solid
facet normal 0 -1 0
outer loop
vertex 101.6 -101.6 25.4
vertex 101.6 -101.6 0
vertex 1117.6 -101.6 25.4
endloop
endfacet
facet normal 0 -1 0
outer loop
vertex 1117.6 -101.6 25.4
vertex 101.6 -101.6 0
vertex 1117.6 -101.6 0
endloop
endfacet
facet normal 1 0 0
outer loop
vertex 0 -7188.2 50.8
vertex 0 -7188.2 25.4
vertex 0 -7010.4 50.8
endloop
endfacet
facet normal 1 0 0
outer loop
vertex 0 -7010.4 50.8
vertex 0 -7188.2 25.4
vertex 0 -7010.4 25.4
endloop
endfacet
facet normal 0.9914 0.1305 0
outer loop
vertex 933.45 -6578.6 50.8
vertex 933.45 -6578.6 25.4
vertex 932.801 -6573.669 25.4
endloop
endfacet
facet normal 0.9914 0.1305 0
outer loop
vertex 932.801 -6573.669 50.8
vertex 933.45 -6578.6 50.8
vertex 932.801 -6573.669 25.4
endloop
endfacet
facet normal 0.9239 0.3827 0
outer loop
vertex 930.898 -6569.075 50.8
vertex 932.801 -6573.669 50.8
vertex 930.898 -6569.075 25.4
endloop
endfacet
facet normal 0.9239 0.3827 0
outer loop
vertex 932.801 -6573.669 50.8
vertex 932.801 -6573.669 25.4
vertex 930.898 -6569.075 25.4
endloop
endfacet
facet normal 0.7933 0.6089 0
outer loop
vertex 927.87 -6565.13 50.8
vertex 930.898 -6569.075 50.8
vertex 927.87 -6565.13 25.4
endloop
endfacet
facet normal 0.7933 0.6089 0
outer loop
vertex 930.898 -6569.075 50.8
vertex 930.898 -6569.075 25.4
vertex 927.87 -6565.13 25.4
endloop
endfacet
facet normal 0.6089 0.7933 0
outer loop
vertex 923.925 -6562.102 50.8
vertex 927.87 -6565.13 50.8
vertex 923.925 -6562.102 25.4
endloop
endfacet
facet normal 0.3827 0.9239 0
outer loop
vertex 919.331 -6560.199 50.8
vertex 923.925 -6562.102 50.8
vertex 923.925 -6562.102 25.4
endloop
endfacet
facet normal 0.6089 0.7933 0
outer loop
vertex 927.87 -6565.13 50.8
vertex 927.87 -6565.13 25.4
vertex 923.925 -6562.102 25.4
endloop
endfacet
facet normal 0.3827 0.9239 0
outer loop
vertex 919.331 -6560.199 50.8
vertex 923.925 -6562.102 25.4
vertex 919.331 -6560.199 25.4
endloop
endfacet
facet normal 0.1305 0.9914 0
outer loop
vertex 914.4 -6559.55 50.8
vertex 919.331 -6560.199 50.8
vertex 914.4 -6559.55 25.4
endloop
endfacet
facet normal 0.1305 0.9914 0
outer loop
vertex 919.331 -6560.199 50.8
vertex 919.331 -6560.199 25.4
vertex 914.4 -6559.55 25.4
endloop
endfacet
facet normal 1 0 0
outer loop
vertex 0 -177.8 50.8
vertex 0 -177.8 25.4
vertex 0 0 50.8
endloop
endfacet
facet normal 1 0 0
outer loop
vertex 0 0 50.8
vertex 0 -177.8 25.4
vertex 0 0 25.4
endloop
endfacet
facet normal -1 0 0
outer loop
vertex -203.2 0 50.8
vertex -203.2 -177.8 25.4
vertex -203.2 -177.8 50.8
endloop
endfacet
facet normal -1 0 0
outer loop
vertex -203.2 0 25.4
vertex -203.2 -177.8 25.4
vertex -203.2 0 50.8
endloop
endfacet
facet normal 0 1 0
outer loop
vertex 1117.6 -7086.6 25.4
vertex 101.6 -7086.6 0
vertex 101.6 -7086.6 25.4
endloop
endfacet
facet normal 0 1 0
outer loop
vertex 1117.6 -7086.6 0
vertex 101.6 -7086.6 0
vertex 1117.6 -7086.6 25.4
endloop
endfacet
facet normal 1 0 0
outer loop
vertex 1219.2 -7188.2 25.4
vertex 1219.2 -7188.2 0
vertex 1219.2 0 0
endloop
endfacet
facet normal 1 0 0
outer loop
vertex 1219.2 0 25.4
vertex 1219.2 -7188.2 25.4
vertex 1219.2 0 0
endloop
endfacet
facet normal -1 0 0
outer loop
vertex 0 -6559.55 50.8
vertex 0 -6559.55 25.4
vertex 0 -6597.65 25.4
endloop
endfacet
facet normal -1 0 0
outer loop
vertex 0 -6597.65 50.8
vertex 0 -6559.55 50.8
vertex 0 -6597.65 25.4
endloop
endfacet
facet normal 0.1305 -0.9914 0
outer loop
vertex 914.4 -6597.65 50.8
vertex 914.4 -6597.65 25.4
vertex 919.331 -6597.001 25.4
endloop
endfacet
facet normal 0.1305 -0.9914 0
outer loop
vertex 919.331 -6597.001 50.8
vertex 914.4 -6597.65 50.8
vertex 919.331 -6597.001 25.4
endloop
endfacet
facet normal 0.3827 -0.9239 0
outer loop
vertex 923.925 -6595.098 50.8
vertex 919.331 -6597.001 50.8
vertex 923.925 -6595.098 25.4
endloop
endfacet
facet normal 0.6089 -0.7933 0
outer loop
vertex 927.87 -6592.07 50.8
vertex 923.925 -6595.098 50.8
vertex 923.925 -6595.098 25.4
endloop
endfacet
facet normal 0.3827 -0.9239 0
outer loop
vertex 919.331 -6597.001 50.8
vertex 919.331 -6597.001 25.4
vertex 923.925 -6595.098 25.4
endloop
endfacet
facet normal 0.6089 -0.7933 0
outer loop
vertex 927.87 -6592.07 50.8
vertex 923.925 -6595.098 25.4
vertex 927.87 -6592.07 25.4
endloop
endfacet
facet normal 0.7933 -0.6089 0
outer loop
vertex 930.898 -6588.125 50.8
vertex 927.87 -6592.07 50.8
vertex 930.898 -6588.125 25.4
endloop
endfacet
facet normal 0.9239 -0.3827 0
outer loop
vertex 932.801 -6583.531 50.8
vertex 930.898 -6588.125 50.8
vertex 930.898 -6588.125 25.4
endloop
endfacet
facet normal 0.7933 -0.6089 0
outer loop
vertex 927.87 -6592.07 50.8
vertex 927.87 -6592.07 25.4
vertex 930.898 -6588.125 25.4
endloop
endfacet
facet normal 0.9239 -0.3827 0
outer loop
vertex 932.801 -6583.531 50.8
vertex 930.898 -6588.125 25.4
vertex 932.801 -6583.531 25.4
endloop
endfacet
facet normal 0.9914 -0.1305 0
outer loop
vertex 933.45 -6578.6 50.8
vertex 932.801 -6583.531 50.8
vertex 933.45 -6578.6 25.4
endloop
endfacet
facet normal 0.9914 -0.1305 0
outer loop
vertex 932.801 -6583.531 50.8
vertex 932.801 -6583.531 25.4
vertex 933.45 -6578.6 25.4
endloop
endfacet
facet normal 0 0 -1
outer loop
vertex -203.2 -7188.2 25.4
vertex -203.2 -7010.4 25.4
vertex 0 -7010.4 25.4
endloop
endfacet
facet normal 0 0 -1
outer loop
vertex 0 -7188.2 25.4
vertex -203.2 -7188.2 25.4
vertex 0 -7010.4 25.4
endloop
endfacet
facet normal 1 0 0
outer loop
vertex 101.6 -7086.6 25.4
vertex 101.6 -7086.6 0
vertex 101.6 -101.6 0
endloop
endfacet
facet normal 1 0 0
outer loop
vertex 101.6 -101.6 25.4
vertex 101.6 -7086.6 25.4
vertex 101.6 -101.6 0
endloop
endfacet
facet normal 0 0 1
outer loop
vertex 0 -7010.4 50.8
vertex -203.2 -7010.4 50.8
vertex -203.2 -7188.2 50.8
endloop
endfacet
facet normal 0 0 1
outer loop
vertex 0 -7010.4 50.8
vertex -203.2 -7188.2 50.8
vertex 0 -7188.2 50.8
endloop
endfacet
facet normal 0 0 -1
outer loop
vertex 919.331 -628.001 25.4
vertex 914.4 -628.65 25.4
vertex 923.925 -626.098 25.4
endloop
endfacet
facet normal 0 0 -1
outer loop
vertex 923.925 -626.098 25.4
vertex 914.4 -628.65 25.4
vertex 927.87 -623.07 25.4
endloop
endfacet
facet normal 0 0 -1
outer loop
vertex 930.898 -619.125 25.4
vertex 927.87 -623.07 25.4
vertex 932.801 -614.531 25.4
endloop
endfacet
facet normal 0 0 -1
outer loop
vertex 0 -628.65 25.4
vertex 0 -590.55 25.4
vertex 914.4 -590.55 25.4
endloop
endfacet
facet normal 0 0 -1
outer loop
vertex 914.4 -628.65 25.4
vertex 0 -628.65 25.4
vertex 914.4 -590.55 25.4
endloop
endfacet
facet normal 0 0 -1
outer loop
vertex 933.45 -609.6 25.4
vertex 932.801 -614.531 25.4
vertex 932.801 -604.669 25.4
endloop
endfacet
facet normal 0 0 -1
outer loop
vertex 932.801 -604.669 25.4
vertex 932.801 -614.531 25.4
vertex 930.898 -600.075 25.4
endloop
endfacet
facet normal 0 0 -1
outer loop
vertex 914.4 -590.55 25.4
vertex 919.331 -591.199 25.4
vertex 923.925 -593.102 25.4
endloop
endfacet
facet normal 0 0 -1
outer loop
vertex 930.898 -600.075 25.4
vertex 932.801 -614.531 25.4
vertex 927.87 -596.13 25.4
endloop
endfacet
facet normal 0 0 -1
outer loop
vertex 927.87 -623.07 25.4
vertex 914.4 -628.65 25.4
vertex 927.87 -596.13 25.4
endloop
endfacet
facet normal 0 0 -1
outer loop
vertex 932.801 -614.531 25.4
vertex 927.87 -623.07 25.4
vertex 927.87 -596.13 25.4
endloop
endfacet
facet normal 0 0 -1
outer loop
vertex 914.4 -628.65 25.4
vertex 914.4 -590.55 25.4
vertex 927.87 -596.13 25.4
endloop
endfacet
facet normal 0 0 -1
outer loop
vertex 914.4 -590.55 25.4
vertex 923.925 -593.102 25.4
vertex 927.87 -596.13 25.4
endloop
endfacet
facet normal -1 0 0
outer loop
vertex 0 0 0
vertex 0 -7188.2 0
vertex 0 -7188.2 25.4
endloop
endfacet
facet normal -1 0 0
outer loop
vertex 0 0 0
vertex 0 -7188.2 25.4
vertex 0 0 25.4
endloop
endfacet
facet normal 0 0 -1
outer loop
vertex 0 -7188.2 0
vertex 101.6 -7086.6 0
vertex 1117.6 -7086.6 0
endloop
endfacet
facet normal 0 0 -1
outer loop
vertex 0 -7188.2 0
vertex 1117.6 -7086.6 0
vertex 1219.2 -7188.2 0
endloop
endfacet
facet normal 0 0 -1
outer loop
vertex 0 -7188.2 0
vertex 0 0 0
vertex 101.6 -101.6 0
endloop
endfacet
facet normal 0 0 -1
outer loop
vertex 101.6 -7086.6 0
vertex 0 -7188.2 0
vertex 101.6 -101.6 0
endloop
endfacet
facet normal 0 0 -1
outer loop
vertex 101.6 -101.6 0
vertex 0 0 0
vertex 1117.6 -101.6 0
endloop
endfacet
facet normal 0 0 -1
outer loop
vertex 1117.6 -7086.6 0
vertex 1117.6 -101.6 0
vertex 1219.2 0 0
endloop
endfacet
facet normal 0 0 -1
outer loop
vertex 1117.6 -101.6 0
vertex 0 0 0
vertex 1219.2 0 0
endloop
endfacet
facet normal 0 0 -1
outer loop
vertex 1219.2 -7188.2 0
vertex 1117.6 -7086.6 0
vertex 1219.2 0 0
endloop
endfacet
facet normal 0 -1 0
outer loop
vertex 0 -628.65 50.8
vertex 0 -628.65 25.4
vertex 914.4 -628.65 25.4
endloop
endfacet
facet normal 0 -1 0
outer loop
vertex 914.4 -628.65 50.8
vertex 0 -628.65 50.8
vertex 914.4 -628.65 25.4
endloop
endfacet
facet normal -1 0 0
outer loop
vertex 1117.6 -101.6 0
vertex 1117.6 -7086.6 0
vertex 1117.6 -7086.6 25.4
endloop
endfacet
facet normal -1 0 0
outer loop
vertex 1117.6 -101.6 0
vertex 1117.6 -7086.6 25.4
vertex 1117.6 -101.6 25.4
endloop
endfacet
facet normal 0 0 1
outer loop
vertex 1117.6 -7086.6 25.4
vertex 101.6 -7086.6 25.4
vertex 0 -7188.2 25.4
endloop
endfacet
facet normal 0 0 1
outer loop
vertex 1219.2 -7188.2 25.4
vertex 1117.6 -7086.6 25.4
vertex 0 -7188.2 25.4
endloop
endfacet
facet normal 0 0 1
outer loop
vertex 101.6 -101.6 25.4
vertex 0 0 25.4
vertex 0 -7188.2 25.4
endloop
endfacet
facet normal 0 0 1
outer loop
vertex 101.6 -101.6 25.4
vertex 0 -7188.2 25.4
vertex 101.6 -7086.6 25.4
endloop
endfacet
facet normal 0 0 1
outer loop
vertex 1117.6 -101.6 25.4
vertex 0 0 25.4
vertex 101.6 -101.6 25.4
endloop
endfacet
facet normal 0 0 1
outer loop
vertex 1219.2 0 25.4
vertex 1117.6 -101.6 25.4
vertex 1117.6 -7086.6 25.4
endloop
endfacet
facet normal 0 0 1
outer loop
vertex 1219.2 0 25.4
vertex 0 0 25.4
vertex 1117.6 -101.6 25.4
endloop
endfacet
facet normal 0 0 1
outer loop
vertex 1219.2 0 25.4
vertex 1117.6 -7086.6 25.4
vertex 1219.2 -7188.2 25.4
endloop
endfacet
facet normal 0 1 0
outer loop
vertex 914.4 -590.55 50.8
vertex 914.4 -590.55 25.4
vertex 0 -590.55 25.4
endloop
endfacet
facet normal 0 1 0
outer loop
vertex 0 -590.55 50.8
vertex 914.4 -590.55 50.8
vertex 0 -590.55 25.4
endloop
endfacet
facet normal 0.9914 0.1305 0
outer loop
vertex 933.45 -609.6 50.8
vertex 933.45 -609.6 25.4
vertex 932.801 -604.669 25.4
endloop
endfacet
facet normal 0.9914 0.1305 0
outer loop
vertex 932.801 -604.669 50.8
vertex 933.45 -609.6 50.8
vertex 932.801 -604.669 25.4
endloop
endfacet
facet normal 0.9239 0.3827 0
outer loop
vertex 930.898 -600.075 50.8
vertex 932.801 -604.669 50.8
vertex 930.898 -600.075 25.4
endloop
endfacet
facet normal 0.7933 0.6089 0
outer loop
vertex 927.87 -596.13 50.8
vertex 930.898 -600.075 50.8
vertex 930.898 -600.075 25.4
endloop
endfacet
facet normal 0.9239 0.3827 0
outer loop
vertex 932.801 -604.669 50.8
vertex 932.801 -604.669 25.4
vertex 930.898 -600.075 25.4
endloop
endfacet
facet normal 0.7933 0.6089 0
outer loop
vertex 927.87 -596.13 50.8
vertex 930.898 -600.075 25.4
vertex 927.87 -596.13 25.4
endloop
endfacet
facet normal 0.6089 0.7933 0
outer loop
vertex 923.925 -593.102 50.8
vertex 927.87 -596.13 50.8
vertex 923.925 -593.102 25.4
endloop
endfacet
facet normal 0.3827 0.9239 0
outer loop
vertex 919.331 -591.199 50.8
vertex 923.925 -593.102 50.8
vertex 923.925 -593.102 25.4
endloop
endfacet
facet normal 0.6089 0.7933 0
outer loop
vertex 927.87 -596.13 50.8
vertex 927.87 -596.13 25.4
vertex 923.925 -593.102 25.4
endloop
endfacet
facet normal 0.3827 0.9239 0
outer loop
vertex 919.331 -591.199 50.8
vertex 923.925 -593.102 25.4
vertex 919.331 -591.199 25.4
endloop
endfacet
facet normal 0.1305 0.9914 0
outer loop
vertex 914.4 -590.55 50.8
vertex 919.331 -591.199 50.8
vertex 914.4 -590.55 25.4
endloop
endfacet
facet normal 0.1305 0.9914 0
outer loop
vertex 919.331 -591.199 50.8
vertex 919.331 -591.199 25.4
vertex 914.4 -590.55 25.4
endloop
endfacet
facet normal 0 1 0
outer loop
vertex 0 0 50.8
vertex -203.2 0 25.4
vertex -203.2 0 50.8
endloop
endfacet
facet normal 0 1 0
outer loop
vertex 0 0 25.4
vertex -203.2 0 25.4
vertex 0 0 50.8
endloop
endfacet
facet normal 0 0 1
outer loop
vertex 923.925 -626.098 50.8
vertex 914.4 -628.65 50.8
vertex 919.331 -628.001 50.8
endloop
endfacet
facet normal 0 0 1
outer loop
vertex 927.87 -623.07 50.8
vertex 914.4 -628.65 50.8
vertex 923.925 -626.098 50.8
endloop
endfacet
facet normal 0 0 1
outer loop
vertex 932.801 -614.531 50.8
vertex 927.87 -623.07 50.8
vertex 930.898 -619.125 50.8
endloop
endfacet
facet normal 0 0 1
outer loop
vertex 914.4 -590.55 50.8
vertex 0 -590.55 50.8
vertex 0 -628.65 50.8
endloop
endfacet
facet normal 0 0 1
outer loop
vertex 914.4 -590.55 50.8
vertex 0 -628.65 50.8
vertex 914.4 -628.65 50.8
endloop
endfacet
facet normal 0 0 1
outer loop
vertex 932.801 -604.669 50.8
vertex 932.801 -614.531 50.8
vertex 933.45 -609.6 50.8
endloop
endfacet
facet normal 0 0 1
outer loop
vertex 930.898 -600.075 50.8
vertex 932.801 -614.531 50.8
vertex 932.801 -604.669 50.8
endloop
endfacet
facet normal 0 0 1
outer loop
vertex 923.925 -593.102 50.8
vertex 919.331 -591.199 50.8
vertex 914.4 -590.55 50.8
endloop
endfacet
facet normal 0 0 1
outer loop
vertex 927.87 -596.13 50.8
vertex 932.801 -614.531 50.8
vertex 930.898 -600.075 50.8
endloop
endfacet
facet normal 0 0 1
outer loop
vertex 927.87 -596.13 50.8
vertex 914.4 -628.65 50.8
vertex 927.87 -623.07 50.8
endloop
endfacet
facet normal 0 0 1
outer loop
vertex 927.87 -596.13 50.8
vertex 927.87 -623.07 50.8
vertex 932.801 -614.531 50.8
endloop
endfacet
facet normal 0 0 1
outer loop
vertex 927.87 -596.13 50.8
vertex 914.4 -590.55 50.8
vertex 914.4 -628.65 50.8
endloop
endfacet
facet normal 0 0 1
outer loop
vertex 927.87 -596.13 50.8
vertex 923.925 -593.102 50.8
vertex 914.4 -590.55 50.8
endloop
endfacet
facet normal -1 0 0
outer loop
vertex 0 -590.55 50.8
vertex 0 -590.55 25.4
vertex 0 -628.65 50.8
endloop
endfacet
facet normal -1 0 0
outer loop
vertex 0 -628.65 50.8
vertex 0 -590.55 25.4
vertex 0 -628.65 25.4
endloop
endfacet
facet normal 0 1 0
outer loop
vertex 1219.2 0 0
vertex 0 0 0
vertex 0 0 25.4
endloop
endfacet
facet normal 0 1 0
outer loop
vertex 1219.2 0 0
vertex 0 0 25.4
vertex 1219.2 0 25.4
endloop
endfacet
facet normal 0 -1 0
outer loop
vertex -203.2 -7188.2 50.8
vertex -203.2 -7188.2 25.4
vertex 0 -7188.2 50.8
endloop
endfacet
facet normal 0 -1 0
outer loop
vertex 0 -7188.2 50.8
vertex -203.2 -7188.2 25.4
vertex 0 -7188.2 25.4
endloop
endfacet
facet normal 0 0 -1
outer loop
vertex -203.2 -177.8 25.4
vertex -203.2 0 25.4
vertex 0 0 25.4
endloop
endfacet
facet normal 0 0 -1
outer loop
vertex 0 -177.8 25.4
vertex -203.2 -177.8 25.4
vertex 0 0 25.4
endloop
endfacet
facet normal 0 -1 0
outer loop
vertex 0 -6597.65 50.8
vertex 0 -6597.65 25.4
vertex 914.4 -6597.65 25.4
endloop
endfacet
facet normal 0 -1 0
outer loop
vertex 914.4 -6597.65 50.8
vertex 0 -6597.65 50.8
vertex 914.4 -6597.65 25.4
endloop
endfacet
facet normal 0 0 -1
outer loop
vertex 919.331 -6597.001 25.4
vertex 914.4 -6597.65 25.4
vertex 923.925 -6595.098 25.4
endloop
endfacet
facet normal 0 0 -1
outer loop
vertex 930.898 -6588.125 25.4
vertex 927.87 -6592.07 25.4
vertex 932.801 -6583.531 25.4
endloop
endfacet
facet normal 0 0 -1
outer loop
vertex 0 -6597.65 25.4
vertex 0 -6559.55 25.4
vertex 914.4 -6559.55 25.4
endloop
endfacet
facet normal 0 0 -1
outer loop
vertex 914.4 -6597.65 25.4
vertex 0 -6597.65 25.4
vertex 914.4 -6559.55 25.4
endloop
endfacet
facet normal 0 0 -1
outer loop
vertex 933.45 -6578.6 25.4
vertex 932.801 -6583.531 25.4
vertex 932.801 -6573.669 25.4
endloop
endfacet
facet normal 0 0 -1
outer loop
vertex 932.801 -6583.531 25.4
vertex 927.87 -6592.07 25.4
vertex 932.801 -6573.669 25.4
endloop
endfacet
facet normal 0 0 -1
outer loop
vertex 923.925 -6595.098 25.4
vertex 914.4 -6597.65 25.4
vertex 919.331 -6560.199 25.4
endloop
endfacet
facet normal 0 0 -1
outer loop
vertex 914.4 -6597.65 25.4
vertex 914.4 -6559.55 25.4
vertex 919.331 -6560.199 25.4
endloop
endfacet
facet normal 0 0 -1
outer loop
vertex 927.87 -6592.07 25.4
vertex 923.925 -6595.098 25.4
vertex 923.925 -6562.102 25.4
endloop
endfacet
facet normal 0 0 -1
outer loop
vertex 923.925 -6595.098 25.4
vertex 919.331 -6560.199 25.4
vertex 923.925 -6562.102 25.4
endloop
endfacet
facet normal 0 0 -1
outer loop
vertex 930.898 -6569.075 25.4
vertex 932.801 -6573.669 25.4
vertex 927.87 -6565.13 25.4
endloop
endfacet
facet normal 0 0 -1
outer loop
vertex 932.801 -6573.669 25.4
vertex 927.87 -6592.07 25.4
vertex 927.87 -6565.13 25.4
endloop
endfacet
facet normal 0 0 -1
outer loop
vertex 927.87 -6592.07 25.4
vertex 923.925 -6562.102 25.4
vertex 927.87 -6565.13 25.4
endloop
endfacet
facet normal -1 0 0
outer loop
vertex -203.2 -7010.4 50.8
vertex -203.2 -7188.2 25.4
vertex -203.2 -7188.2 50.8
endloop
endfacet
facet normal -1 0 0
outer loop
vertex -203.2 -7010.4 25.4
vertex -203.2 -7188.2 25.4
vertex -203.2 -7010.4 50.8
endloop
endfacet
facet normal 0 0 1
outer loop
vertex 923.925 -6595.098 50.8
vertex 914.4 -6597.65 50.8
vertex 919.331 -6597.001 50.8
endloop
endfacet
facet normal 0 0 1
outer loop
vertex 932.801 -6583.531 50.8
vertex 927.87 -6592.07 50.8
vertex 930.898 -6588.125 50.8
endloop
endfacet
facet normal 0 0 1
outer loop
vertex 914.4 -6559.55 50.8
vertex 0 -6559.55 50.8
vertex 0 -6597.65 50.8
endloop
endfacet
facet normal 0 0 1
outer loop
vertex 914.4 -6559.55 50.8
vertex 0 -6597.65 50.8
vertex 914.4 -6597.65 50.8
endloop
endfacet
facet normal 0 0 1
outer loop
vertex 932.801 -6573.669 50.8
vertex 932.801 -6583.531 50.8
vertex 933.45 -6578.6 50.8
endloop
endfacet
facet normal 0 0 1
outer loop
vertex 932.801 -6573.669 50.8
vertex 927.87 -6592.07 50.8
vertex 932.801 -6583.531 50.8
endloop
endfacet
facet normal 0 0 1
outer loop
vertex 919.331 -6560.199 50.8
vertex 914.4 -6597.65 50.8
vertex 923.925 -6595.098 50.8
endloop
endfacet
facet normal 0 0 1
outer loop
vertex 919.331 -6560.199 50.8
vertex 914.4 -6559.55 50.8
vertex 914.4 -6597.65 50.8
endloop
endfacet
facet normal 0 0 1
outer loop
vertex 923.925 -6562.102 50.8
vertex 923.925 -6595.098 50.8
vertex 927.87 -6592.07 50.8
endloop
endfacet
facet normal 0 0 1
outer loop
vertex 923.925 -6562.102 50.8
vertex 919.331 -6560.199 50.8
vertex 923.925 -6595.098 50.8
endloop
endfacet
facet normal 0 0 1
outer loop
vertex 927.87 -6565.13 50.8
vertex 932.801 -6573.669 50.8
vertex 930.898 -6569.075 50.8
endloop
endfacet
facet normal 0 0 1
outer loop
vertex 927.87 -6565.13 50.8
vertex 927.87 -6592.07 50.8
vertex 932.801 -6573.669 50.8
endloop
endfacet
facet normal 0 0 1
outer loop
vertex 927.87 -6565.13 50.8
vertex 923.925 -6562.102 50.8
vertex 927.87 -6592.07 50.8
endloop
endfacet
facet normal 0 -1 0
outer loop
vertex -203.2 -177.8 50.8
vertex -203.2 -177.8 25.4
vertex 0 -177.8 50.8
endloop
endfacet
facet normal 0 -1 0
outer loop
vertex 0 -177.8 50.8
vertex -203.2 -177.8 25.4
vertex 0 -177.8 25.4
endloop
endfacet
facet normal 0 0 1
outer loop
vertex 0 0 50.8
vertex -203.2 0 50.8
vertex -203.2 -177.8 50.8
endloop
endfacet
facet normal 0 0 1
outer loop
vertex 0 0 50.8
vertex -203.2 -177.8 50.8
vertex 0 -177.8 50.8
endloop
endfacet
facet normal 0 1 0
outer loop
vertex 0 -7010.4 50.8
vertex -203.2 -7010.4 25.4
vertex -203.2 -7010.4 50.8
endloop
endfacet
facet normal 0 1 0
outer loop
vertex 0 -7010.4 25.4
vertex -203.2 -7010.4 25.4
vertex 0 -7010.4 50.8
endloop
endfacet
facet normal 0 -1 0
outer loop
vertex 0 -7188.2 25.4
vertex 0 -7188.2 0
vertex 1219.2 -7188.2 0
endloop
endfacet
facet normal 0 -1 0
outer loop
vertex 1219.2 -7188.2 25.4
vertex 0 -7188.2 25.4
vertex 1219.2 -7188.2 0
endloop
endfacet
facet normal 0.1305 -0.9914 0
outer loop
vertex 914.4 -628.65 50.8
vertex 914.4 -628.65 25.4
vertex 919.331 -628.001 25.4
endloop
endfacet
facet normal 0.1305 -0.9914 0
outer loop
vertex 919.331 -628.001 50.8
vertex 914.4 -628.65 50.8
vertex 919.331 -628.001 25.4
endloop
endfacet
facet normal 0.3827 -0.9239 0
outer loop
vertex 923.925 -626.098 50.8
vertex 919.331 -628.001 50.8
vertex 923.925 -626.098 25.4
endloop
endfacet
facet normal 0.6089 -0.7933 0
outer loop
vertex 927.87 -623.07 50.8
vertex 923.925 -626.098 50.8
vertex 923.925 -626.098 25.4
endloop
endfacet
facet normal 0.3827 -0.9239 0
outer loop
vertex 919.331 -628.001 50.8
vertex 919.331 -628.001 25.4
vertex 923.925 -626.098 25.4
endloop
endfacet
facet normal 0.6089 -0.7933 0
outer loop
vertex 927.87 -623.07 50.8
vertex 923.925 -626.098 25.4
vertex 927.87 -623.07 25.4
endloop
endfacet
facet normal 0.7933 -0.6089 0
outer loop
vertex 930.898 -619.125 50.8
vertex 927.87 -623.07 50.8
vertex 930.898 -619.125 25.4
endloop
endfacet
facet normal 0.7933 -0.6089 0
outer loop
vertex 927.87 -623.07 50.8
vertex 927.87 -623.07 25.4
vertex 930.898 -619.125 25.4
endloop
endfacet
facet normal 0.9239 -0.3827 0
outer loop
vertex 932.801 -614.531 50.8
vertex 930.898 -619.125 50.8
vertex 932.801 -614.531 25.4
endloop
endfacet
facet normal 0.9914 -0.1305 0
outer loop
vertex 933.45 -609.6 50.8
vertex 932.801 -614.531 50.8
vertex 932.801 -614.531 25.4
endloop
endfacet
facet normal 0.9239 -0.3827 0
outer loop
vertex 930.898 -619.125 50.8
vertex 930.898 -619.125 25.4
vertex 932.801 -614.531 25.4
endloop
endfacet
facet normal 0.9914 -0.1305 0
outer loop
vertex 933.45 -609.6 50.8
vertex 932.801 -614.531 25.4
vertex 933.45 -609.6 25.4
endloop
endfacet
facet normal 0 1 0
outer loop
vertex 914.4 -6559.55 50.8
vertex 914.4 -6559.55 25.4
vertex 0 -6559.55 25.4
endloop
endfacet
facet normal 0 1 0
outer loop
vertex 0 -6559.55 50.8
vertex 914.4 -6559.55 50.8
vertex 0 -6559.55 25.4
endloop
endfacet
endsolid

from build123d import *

# Parameters (mm, degrees)
F0_W     = 1219.2
F0_H     = 7188.2
F0_W_2   = 1016
F0_H_2   = 6985
F1_DEPTH = 25.4
F2_W     = 203.2
F2_H     = 177.8
F3_DEPTH = 25.4


with BuildPart() as f1:
    # F0 (on Top) → F1 (new body)
    with BuildSketch(Plane.XY):
        with Locations((609.6, -3594.1)):
            Rectangle(F0_W, F0_H)
        with Locations((609.6, -3594.1)):
            Rectangle(F0_W_2, F0_H_2, mode=Mode.SUBTRACT)
    extrude(amount=F1_DEPTH)


with BuildPart() as f3:
    # F2 (on face) → F3 (new body)
    with BuildSketch(Plane.XY.offset(25.4)):
        with Locations((-101.6, -88.9)):
            Rectangle(F2_W, F2_H)
    extrude(amount=F3_DEPTH)


with BuildPart() as f3b:
    # F2 (on face) → F3, piece 2 (new body)
    with BuildSketch(Plane.XY.offset(25.4)):
        with Locations((-101.6, -7099.3)):
            Rectangle(F2_W, F2_H)
    extrude(amount=F3_DEPTH)


with BuildPart() as f3c:
    # F2 (on face) → F3, piece 3 (new body)
    with BuildSketch(Plane.XY.offset(25.4)):
        with BuildLine():
            Line((914.4, -590.55), (0, -590.55))
            Line((0, -590.55), (0, -628.65))
            Line((0, -628.65), (914.4, -628.65))
            ThreePointArc((914.4, -628.65), (895.35, -609.6), (914.4, -590.55))
        make_face()
        with BuildLine():
            ThreePointArc((933.45, -609.6), (927.8703841816, -596.1296158184), (914.4, -590.55))
            Line((914.4, -590.55), (914.4, -628.65))
            ThreePointArc((914.4, -628.65), (927.8703841816, -623.0703841816), (933.45, -609.6))
        make_face()
        with BuildLine():
            Line((914.4, -628.65), (914.4, -590.55))
            ThreePointArc((914.4, -590.55), (895.35, -609.6), (914.4, -628.65))
        make_face()
    extrude(amount=F3_DEPTH)


with BuildPart() as f3d:
    # F2 (on face) → F3, piece 4 (new body)
    with BuildSketch(Plane.XY.offset(25.4)):
        with BuildLine():
            Line((914.4, -6559.55), (0, -6559.55))
            Line((0, -6559.55), (0, -6597.65))
            Line((0, -6597.65), (914.4, -6597.65))
            ThreePointArc((914.4, -6597.65), (895.35, -6578.6), (914.4, -6559.55))
        make_face()
        with BuildLine():
            ThreePointArc((933.45, -6578.6), (927.8703841816, -6565.1296158184), (914.4, -6559.55))
            Line((914.4, -6559.55), (914.4, -6597.65))
            ThreePointArc((914.4, -6597.65), (927.8703841816, -6592.0703841816), (933.45, -6578.6))
        make_face()
        with BuildLine():
            Line((914.4, -6597.65), (914.4, -6559.55))
            ThreePointArc((914.4, -6559.55), (895.35, -6578.6), (914.4, -6597.65))
        make_face()
    extrude(amount=F3_DEPTH)


solid = Compound([f1.part, f3.part, f3b.part, f3c.part, f3d.part])
